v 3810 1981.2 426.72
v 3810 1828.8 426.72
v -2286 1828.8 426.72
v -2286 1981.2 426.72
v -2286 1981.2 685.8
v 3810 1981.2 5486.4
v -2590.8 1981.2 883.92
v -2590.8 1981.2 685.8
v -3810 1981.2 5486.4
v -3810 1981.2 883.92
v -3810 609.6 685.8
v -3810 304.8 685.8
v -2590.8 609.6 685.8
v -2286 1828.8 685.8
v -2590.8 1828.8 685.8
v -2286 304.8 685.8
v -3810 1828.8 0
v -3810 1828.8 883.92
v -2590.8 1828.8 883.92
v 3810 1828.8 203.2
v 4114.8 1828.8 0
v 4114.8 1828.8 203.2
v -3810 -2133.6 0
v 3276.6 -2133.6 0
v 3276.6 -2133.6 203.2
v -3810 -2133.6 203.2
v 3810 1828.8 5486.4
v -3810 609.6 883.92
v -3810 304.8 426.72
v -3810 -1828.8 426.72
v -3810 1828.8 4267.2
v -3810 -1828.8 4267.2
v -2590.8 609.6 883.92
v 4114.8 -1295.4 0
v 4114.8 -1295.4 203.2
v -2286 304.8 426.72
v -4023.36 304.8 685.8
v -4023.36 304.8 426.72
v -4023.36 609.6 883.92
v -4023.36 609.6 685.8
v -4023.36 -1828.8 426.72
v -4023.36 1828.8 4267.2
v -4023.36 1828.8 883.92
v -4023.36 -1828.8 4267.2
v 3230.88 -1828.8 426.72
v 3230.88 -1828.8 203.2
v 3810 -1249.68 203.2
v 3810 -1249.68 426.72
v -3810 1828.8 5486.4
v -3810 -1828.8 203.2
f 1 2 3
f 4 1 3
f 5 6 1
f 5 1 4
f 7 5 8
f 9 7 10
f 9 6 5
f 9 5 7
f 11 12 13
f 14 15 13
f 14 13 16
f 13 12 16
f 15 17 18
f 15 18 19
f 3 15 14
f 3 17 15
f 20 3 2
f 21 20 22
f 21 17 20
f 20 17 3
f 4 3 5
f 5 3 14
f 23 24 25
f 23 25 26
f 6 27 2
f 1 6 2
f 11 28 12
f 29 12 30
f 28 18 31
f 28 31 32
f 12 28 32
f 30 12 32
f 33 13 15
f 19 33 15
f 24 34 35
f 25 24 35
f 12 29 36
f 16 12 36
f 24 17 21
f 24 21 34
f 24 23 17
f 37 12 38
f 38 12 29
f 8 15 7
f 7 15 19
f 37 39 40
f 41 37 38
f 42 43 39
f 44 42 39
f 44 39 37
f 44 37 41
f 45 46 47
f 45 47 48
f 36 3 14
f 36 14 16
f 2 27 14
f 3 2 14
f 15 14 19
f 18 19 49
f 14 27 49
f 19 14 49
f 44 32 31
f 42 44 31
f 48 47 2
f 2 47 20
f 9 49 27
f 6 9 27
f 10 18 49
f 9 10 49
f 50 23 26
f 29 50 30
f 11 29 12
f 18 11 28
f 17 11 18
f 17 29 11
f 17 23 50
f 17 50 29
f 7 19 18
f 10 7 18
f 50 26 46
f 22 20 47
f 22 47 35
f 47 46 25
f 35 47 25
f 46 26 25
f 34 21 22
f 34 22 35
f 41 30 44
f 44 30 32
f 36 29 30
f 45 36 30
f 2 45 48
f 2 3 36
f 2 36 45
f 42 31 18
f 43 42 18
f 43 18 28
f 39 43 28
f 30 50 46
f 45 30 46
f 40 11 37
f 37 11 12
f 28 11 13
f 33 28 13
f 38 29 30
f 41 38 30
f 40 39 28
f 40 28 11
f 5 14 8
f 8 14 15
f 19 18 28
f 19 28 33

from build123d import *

# Parameters (mm, degrees)
F0_W      = 7620
F0_H      = 3657.6
F1_DEPTH  = 426.72
F2_SIZE   = 579.12
F4_DEPTH  = 203.2
F5_SIZE   = 838.2
F6_W      = 1219.2
F6_H      = 1219.2
F7_DEPTH  = 457.2
F8_W      = 1524
F8_H      = 1524
F9_DEPTH  = 685.8
F11_DEPTH = 152.4
F13_DEPTH = 213.36


with BuildPart() as f1:
    # F0 (on Top) → F1 (new body)
    with BuildSketch(Plane.XY):
        Rectangle(F0_W, F0_H)
    extrude(amount=F1_DEPTH)

    # F2
    f2_edges = [f1.edges().sort_by_distance(p)[0] for p in [
        (3810, -1828.8, 213.36),
    ]]
    chamfer(f2_edges, length=F2_SIZE)

    # F3 (on face) → F4 (join)
    with BuildSketch(Plane(origin=(0, 0, 0), x_dir=(1, 0, 0), z_dir=(0, 0, -1))):
        Polygon((3810, 1249.68), (3810, -1828.8), (4114.8, -1828.8), (4114.8, 2133.6), (-3810, 2133.6), (-3810, 1828.8), (3230.88, 1828.8), align=None)
    extrude(amount=-F4_DEPTH)

    # F5
    f5_edges = [f1.edges().sort_by_distance(p)[0] for p in [
        (4114.8, -2133.6, 101.6),
    ]]
    chamfer(f5_edges, length=F5_SIZE)

    # F6 (on face) → F7 (join)
    with BuildSketch(Plane.XY.offset(426.72)):
        with Locations((-3200.4, 1219.2)):
            Rectangle(F6_W, F6_H)
    extrude(amount=F7_DEPTH)

    # F8 (on face) → F9 (join)
    with BuildSketch(Plane(origin=(0, 0, 0), x_dir=(1, 0, 0), z_dir=(0, 0, -1))):
        with Locations((-3048, -1066.8)):
            Rectangle(F8_W, F8_H)
    extrude(amount=-F9_DEPTH)


with BuildPart() as f11:
    # F10 (on face) → F11 (new body)
    with BuildSketch(Plane(origin=(0, 1828.8, 0), x_dir=(-1, 0, 0), z_dir=(0, 1, 0))):
        Polygon((2590.8, 883.92), (3810, 883.92), (3810, 5486.4), (-3810, 5486.4), (-3810, 426.72), (2286, 426.72), (2286, 685.8), (2590.8, 685.8), align=None)
    extrude(amount=F11_DEPTH)


with BuildPart() as f13:
    # F12 (on face) → F13 (new body)
    with BuildSketch(Plane(origin=(-3810, 0, 0), x_dir=(0, -1, 0), z_dir=(-1, 0, 0))):
        Polygon((-1828.8, 4267.2), (-1828.8, 883.92), (-609.6, 883.92), (-609.6, 685.8), (-304.8, 685.8), (-304.8, 426.72), (1828.8, 426.72), (1828.8, 4267.2), align=None)
    extrude(amount=F13_DEPTH)


solid = Compound([f1.part, f11.part, f13.part])
